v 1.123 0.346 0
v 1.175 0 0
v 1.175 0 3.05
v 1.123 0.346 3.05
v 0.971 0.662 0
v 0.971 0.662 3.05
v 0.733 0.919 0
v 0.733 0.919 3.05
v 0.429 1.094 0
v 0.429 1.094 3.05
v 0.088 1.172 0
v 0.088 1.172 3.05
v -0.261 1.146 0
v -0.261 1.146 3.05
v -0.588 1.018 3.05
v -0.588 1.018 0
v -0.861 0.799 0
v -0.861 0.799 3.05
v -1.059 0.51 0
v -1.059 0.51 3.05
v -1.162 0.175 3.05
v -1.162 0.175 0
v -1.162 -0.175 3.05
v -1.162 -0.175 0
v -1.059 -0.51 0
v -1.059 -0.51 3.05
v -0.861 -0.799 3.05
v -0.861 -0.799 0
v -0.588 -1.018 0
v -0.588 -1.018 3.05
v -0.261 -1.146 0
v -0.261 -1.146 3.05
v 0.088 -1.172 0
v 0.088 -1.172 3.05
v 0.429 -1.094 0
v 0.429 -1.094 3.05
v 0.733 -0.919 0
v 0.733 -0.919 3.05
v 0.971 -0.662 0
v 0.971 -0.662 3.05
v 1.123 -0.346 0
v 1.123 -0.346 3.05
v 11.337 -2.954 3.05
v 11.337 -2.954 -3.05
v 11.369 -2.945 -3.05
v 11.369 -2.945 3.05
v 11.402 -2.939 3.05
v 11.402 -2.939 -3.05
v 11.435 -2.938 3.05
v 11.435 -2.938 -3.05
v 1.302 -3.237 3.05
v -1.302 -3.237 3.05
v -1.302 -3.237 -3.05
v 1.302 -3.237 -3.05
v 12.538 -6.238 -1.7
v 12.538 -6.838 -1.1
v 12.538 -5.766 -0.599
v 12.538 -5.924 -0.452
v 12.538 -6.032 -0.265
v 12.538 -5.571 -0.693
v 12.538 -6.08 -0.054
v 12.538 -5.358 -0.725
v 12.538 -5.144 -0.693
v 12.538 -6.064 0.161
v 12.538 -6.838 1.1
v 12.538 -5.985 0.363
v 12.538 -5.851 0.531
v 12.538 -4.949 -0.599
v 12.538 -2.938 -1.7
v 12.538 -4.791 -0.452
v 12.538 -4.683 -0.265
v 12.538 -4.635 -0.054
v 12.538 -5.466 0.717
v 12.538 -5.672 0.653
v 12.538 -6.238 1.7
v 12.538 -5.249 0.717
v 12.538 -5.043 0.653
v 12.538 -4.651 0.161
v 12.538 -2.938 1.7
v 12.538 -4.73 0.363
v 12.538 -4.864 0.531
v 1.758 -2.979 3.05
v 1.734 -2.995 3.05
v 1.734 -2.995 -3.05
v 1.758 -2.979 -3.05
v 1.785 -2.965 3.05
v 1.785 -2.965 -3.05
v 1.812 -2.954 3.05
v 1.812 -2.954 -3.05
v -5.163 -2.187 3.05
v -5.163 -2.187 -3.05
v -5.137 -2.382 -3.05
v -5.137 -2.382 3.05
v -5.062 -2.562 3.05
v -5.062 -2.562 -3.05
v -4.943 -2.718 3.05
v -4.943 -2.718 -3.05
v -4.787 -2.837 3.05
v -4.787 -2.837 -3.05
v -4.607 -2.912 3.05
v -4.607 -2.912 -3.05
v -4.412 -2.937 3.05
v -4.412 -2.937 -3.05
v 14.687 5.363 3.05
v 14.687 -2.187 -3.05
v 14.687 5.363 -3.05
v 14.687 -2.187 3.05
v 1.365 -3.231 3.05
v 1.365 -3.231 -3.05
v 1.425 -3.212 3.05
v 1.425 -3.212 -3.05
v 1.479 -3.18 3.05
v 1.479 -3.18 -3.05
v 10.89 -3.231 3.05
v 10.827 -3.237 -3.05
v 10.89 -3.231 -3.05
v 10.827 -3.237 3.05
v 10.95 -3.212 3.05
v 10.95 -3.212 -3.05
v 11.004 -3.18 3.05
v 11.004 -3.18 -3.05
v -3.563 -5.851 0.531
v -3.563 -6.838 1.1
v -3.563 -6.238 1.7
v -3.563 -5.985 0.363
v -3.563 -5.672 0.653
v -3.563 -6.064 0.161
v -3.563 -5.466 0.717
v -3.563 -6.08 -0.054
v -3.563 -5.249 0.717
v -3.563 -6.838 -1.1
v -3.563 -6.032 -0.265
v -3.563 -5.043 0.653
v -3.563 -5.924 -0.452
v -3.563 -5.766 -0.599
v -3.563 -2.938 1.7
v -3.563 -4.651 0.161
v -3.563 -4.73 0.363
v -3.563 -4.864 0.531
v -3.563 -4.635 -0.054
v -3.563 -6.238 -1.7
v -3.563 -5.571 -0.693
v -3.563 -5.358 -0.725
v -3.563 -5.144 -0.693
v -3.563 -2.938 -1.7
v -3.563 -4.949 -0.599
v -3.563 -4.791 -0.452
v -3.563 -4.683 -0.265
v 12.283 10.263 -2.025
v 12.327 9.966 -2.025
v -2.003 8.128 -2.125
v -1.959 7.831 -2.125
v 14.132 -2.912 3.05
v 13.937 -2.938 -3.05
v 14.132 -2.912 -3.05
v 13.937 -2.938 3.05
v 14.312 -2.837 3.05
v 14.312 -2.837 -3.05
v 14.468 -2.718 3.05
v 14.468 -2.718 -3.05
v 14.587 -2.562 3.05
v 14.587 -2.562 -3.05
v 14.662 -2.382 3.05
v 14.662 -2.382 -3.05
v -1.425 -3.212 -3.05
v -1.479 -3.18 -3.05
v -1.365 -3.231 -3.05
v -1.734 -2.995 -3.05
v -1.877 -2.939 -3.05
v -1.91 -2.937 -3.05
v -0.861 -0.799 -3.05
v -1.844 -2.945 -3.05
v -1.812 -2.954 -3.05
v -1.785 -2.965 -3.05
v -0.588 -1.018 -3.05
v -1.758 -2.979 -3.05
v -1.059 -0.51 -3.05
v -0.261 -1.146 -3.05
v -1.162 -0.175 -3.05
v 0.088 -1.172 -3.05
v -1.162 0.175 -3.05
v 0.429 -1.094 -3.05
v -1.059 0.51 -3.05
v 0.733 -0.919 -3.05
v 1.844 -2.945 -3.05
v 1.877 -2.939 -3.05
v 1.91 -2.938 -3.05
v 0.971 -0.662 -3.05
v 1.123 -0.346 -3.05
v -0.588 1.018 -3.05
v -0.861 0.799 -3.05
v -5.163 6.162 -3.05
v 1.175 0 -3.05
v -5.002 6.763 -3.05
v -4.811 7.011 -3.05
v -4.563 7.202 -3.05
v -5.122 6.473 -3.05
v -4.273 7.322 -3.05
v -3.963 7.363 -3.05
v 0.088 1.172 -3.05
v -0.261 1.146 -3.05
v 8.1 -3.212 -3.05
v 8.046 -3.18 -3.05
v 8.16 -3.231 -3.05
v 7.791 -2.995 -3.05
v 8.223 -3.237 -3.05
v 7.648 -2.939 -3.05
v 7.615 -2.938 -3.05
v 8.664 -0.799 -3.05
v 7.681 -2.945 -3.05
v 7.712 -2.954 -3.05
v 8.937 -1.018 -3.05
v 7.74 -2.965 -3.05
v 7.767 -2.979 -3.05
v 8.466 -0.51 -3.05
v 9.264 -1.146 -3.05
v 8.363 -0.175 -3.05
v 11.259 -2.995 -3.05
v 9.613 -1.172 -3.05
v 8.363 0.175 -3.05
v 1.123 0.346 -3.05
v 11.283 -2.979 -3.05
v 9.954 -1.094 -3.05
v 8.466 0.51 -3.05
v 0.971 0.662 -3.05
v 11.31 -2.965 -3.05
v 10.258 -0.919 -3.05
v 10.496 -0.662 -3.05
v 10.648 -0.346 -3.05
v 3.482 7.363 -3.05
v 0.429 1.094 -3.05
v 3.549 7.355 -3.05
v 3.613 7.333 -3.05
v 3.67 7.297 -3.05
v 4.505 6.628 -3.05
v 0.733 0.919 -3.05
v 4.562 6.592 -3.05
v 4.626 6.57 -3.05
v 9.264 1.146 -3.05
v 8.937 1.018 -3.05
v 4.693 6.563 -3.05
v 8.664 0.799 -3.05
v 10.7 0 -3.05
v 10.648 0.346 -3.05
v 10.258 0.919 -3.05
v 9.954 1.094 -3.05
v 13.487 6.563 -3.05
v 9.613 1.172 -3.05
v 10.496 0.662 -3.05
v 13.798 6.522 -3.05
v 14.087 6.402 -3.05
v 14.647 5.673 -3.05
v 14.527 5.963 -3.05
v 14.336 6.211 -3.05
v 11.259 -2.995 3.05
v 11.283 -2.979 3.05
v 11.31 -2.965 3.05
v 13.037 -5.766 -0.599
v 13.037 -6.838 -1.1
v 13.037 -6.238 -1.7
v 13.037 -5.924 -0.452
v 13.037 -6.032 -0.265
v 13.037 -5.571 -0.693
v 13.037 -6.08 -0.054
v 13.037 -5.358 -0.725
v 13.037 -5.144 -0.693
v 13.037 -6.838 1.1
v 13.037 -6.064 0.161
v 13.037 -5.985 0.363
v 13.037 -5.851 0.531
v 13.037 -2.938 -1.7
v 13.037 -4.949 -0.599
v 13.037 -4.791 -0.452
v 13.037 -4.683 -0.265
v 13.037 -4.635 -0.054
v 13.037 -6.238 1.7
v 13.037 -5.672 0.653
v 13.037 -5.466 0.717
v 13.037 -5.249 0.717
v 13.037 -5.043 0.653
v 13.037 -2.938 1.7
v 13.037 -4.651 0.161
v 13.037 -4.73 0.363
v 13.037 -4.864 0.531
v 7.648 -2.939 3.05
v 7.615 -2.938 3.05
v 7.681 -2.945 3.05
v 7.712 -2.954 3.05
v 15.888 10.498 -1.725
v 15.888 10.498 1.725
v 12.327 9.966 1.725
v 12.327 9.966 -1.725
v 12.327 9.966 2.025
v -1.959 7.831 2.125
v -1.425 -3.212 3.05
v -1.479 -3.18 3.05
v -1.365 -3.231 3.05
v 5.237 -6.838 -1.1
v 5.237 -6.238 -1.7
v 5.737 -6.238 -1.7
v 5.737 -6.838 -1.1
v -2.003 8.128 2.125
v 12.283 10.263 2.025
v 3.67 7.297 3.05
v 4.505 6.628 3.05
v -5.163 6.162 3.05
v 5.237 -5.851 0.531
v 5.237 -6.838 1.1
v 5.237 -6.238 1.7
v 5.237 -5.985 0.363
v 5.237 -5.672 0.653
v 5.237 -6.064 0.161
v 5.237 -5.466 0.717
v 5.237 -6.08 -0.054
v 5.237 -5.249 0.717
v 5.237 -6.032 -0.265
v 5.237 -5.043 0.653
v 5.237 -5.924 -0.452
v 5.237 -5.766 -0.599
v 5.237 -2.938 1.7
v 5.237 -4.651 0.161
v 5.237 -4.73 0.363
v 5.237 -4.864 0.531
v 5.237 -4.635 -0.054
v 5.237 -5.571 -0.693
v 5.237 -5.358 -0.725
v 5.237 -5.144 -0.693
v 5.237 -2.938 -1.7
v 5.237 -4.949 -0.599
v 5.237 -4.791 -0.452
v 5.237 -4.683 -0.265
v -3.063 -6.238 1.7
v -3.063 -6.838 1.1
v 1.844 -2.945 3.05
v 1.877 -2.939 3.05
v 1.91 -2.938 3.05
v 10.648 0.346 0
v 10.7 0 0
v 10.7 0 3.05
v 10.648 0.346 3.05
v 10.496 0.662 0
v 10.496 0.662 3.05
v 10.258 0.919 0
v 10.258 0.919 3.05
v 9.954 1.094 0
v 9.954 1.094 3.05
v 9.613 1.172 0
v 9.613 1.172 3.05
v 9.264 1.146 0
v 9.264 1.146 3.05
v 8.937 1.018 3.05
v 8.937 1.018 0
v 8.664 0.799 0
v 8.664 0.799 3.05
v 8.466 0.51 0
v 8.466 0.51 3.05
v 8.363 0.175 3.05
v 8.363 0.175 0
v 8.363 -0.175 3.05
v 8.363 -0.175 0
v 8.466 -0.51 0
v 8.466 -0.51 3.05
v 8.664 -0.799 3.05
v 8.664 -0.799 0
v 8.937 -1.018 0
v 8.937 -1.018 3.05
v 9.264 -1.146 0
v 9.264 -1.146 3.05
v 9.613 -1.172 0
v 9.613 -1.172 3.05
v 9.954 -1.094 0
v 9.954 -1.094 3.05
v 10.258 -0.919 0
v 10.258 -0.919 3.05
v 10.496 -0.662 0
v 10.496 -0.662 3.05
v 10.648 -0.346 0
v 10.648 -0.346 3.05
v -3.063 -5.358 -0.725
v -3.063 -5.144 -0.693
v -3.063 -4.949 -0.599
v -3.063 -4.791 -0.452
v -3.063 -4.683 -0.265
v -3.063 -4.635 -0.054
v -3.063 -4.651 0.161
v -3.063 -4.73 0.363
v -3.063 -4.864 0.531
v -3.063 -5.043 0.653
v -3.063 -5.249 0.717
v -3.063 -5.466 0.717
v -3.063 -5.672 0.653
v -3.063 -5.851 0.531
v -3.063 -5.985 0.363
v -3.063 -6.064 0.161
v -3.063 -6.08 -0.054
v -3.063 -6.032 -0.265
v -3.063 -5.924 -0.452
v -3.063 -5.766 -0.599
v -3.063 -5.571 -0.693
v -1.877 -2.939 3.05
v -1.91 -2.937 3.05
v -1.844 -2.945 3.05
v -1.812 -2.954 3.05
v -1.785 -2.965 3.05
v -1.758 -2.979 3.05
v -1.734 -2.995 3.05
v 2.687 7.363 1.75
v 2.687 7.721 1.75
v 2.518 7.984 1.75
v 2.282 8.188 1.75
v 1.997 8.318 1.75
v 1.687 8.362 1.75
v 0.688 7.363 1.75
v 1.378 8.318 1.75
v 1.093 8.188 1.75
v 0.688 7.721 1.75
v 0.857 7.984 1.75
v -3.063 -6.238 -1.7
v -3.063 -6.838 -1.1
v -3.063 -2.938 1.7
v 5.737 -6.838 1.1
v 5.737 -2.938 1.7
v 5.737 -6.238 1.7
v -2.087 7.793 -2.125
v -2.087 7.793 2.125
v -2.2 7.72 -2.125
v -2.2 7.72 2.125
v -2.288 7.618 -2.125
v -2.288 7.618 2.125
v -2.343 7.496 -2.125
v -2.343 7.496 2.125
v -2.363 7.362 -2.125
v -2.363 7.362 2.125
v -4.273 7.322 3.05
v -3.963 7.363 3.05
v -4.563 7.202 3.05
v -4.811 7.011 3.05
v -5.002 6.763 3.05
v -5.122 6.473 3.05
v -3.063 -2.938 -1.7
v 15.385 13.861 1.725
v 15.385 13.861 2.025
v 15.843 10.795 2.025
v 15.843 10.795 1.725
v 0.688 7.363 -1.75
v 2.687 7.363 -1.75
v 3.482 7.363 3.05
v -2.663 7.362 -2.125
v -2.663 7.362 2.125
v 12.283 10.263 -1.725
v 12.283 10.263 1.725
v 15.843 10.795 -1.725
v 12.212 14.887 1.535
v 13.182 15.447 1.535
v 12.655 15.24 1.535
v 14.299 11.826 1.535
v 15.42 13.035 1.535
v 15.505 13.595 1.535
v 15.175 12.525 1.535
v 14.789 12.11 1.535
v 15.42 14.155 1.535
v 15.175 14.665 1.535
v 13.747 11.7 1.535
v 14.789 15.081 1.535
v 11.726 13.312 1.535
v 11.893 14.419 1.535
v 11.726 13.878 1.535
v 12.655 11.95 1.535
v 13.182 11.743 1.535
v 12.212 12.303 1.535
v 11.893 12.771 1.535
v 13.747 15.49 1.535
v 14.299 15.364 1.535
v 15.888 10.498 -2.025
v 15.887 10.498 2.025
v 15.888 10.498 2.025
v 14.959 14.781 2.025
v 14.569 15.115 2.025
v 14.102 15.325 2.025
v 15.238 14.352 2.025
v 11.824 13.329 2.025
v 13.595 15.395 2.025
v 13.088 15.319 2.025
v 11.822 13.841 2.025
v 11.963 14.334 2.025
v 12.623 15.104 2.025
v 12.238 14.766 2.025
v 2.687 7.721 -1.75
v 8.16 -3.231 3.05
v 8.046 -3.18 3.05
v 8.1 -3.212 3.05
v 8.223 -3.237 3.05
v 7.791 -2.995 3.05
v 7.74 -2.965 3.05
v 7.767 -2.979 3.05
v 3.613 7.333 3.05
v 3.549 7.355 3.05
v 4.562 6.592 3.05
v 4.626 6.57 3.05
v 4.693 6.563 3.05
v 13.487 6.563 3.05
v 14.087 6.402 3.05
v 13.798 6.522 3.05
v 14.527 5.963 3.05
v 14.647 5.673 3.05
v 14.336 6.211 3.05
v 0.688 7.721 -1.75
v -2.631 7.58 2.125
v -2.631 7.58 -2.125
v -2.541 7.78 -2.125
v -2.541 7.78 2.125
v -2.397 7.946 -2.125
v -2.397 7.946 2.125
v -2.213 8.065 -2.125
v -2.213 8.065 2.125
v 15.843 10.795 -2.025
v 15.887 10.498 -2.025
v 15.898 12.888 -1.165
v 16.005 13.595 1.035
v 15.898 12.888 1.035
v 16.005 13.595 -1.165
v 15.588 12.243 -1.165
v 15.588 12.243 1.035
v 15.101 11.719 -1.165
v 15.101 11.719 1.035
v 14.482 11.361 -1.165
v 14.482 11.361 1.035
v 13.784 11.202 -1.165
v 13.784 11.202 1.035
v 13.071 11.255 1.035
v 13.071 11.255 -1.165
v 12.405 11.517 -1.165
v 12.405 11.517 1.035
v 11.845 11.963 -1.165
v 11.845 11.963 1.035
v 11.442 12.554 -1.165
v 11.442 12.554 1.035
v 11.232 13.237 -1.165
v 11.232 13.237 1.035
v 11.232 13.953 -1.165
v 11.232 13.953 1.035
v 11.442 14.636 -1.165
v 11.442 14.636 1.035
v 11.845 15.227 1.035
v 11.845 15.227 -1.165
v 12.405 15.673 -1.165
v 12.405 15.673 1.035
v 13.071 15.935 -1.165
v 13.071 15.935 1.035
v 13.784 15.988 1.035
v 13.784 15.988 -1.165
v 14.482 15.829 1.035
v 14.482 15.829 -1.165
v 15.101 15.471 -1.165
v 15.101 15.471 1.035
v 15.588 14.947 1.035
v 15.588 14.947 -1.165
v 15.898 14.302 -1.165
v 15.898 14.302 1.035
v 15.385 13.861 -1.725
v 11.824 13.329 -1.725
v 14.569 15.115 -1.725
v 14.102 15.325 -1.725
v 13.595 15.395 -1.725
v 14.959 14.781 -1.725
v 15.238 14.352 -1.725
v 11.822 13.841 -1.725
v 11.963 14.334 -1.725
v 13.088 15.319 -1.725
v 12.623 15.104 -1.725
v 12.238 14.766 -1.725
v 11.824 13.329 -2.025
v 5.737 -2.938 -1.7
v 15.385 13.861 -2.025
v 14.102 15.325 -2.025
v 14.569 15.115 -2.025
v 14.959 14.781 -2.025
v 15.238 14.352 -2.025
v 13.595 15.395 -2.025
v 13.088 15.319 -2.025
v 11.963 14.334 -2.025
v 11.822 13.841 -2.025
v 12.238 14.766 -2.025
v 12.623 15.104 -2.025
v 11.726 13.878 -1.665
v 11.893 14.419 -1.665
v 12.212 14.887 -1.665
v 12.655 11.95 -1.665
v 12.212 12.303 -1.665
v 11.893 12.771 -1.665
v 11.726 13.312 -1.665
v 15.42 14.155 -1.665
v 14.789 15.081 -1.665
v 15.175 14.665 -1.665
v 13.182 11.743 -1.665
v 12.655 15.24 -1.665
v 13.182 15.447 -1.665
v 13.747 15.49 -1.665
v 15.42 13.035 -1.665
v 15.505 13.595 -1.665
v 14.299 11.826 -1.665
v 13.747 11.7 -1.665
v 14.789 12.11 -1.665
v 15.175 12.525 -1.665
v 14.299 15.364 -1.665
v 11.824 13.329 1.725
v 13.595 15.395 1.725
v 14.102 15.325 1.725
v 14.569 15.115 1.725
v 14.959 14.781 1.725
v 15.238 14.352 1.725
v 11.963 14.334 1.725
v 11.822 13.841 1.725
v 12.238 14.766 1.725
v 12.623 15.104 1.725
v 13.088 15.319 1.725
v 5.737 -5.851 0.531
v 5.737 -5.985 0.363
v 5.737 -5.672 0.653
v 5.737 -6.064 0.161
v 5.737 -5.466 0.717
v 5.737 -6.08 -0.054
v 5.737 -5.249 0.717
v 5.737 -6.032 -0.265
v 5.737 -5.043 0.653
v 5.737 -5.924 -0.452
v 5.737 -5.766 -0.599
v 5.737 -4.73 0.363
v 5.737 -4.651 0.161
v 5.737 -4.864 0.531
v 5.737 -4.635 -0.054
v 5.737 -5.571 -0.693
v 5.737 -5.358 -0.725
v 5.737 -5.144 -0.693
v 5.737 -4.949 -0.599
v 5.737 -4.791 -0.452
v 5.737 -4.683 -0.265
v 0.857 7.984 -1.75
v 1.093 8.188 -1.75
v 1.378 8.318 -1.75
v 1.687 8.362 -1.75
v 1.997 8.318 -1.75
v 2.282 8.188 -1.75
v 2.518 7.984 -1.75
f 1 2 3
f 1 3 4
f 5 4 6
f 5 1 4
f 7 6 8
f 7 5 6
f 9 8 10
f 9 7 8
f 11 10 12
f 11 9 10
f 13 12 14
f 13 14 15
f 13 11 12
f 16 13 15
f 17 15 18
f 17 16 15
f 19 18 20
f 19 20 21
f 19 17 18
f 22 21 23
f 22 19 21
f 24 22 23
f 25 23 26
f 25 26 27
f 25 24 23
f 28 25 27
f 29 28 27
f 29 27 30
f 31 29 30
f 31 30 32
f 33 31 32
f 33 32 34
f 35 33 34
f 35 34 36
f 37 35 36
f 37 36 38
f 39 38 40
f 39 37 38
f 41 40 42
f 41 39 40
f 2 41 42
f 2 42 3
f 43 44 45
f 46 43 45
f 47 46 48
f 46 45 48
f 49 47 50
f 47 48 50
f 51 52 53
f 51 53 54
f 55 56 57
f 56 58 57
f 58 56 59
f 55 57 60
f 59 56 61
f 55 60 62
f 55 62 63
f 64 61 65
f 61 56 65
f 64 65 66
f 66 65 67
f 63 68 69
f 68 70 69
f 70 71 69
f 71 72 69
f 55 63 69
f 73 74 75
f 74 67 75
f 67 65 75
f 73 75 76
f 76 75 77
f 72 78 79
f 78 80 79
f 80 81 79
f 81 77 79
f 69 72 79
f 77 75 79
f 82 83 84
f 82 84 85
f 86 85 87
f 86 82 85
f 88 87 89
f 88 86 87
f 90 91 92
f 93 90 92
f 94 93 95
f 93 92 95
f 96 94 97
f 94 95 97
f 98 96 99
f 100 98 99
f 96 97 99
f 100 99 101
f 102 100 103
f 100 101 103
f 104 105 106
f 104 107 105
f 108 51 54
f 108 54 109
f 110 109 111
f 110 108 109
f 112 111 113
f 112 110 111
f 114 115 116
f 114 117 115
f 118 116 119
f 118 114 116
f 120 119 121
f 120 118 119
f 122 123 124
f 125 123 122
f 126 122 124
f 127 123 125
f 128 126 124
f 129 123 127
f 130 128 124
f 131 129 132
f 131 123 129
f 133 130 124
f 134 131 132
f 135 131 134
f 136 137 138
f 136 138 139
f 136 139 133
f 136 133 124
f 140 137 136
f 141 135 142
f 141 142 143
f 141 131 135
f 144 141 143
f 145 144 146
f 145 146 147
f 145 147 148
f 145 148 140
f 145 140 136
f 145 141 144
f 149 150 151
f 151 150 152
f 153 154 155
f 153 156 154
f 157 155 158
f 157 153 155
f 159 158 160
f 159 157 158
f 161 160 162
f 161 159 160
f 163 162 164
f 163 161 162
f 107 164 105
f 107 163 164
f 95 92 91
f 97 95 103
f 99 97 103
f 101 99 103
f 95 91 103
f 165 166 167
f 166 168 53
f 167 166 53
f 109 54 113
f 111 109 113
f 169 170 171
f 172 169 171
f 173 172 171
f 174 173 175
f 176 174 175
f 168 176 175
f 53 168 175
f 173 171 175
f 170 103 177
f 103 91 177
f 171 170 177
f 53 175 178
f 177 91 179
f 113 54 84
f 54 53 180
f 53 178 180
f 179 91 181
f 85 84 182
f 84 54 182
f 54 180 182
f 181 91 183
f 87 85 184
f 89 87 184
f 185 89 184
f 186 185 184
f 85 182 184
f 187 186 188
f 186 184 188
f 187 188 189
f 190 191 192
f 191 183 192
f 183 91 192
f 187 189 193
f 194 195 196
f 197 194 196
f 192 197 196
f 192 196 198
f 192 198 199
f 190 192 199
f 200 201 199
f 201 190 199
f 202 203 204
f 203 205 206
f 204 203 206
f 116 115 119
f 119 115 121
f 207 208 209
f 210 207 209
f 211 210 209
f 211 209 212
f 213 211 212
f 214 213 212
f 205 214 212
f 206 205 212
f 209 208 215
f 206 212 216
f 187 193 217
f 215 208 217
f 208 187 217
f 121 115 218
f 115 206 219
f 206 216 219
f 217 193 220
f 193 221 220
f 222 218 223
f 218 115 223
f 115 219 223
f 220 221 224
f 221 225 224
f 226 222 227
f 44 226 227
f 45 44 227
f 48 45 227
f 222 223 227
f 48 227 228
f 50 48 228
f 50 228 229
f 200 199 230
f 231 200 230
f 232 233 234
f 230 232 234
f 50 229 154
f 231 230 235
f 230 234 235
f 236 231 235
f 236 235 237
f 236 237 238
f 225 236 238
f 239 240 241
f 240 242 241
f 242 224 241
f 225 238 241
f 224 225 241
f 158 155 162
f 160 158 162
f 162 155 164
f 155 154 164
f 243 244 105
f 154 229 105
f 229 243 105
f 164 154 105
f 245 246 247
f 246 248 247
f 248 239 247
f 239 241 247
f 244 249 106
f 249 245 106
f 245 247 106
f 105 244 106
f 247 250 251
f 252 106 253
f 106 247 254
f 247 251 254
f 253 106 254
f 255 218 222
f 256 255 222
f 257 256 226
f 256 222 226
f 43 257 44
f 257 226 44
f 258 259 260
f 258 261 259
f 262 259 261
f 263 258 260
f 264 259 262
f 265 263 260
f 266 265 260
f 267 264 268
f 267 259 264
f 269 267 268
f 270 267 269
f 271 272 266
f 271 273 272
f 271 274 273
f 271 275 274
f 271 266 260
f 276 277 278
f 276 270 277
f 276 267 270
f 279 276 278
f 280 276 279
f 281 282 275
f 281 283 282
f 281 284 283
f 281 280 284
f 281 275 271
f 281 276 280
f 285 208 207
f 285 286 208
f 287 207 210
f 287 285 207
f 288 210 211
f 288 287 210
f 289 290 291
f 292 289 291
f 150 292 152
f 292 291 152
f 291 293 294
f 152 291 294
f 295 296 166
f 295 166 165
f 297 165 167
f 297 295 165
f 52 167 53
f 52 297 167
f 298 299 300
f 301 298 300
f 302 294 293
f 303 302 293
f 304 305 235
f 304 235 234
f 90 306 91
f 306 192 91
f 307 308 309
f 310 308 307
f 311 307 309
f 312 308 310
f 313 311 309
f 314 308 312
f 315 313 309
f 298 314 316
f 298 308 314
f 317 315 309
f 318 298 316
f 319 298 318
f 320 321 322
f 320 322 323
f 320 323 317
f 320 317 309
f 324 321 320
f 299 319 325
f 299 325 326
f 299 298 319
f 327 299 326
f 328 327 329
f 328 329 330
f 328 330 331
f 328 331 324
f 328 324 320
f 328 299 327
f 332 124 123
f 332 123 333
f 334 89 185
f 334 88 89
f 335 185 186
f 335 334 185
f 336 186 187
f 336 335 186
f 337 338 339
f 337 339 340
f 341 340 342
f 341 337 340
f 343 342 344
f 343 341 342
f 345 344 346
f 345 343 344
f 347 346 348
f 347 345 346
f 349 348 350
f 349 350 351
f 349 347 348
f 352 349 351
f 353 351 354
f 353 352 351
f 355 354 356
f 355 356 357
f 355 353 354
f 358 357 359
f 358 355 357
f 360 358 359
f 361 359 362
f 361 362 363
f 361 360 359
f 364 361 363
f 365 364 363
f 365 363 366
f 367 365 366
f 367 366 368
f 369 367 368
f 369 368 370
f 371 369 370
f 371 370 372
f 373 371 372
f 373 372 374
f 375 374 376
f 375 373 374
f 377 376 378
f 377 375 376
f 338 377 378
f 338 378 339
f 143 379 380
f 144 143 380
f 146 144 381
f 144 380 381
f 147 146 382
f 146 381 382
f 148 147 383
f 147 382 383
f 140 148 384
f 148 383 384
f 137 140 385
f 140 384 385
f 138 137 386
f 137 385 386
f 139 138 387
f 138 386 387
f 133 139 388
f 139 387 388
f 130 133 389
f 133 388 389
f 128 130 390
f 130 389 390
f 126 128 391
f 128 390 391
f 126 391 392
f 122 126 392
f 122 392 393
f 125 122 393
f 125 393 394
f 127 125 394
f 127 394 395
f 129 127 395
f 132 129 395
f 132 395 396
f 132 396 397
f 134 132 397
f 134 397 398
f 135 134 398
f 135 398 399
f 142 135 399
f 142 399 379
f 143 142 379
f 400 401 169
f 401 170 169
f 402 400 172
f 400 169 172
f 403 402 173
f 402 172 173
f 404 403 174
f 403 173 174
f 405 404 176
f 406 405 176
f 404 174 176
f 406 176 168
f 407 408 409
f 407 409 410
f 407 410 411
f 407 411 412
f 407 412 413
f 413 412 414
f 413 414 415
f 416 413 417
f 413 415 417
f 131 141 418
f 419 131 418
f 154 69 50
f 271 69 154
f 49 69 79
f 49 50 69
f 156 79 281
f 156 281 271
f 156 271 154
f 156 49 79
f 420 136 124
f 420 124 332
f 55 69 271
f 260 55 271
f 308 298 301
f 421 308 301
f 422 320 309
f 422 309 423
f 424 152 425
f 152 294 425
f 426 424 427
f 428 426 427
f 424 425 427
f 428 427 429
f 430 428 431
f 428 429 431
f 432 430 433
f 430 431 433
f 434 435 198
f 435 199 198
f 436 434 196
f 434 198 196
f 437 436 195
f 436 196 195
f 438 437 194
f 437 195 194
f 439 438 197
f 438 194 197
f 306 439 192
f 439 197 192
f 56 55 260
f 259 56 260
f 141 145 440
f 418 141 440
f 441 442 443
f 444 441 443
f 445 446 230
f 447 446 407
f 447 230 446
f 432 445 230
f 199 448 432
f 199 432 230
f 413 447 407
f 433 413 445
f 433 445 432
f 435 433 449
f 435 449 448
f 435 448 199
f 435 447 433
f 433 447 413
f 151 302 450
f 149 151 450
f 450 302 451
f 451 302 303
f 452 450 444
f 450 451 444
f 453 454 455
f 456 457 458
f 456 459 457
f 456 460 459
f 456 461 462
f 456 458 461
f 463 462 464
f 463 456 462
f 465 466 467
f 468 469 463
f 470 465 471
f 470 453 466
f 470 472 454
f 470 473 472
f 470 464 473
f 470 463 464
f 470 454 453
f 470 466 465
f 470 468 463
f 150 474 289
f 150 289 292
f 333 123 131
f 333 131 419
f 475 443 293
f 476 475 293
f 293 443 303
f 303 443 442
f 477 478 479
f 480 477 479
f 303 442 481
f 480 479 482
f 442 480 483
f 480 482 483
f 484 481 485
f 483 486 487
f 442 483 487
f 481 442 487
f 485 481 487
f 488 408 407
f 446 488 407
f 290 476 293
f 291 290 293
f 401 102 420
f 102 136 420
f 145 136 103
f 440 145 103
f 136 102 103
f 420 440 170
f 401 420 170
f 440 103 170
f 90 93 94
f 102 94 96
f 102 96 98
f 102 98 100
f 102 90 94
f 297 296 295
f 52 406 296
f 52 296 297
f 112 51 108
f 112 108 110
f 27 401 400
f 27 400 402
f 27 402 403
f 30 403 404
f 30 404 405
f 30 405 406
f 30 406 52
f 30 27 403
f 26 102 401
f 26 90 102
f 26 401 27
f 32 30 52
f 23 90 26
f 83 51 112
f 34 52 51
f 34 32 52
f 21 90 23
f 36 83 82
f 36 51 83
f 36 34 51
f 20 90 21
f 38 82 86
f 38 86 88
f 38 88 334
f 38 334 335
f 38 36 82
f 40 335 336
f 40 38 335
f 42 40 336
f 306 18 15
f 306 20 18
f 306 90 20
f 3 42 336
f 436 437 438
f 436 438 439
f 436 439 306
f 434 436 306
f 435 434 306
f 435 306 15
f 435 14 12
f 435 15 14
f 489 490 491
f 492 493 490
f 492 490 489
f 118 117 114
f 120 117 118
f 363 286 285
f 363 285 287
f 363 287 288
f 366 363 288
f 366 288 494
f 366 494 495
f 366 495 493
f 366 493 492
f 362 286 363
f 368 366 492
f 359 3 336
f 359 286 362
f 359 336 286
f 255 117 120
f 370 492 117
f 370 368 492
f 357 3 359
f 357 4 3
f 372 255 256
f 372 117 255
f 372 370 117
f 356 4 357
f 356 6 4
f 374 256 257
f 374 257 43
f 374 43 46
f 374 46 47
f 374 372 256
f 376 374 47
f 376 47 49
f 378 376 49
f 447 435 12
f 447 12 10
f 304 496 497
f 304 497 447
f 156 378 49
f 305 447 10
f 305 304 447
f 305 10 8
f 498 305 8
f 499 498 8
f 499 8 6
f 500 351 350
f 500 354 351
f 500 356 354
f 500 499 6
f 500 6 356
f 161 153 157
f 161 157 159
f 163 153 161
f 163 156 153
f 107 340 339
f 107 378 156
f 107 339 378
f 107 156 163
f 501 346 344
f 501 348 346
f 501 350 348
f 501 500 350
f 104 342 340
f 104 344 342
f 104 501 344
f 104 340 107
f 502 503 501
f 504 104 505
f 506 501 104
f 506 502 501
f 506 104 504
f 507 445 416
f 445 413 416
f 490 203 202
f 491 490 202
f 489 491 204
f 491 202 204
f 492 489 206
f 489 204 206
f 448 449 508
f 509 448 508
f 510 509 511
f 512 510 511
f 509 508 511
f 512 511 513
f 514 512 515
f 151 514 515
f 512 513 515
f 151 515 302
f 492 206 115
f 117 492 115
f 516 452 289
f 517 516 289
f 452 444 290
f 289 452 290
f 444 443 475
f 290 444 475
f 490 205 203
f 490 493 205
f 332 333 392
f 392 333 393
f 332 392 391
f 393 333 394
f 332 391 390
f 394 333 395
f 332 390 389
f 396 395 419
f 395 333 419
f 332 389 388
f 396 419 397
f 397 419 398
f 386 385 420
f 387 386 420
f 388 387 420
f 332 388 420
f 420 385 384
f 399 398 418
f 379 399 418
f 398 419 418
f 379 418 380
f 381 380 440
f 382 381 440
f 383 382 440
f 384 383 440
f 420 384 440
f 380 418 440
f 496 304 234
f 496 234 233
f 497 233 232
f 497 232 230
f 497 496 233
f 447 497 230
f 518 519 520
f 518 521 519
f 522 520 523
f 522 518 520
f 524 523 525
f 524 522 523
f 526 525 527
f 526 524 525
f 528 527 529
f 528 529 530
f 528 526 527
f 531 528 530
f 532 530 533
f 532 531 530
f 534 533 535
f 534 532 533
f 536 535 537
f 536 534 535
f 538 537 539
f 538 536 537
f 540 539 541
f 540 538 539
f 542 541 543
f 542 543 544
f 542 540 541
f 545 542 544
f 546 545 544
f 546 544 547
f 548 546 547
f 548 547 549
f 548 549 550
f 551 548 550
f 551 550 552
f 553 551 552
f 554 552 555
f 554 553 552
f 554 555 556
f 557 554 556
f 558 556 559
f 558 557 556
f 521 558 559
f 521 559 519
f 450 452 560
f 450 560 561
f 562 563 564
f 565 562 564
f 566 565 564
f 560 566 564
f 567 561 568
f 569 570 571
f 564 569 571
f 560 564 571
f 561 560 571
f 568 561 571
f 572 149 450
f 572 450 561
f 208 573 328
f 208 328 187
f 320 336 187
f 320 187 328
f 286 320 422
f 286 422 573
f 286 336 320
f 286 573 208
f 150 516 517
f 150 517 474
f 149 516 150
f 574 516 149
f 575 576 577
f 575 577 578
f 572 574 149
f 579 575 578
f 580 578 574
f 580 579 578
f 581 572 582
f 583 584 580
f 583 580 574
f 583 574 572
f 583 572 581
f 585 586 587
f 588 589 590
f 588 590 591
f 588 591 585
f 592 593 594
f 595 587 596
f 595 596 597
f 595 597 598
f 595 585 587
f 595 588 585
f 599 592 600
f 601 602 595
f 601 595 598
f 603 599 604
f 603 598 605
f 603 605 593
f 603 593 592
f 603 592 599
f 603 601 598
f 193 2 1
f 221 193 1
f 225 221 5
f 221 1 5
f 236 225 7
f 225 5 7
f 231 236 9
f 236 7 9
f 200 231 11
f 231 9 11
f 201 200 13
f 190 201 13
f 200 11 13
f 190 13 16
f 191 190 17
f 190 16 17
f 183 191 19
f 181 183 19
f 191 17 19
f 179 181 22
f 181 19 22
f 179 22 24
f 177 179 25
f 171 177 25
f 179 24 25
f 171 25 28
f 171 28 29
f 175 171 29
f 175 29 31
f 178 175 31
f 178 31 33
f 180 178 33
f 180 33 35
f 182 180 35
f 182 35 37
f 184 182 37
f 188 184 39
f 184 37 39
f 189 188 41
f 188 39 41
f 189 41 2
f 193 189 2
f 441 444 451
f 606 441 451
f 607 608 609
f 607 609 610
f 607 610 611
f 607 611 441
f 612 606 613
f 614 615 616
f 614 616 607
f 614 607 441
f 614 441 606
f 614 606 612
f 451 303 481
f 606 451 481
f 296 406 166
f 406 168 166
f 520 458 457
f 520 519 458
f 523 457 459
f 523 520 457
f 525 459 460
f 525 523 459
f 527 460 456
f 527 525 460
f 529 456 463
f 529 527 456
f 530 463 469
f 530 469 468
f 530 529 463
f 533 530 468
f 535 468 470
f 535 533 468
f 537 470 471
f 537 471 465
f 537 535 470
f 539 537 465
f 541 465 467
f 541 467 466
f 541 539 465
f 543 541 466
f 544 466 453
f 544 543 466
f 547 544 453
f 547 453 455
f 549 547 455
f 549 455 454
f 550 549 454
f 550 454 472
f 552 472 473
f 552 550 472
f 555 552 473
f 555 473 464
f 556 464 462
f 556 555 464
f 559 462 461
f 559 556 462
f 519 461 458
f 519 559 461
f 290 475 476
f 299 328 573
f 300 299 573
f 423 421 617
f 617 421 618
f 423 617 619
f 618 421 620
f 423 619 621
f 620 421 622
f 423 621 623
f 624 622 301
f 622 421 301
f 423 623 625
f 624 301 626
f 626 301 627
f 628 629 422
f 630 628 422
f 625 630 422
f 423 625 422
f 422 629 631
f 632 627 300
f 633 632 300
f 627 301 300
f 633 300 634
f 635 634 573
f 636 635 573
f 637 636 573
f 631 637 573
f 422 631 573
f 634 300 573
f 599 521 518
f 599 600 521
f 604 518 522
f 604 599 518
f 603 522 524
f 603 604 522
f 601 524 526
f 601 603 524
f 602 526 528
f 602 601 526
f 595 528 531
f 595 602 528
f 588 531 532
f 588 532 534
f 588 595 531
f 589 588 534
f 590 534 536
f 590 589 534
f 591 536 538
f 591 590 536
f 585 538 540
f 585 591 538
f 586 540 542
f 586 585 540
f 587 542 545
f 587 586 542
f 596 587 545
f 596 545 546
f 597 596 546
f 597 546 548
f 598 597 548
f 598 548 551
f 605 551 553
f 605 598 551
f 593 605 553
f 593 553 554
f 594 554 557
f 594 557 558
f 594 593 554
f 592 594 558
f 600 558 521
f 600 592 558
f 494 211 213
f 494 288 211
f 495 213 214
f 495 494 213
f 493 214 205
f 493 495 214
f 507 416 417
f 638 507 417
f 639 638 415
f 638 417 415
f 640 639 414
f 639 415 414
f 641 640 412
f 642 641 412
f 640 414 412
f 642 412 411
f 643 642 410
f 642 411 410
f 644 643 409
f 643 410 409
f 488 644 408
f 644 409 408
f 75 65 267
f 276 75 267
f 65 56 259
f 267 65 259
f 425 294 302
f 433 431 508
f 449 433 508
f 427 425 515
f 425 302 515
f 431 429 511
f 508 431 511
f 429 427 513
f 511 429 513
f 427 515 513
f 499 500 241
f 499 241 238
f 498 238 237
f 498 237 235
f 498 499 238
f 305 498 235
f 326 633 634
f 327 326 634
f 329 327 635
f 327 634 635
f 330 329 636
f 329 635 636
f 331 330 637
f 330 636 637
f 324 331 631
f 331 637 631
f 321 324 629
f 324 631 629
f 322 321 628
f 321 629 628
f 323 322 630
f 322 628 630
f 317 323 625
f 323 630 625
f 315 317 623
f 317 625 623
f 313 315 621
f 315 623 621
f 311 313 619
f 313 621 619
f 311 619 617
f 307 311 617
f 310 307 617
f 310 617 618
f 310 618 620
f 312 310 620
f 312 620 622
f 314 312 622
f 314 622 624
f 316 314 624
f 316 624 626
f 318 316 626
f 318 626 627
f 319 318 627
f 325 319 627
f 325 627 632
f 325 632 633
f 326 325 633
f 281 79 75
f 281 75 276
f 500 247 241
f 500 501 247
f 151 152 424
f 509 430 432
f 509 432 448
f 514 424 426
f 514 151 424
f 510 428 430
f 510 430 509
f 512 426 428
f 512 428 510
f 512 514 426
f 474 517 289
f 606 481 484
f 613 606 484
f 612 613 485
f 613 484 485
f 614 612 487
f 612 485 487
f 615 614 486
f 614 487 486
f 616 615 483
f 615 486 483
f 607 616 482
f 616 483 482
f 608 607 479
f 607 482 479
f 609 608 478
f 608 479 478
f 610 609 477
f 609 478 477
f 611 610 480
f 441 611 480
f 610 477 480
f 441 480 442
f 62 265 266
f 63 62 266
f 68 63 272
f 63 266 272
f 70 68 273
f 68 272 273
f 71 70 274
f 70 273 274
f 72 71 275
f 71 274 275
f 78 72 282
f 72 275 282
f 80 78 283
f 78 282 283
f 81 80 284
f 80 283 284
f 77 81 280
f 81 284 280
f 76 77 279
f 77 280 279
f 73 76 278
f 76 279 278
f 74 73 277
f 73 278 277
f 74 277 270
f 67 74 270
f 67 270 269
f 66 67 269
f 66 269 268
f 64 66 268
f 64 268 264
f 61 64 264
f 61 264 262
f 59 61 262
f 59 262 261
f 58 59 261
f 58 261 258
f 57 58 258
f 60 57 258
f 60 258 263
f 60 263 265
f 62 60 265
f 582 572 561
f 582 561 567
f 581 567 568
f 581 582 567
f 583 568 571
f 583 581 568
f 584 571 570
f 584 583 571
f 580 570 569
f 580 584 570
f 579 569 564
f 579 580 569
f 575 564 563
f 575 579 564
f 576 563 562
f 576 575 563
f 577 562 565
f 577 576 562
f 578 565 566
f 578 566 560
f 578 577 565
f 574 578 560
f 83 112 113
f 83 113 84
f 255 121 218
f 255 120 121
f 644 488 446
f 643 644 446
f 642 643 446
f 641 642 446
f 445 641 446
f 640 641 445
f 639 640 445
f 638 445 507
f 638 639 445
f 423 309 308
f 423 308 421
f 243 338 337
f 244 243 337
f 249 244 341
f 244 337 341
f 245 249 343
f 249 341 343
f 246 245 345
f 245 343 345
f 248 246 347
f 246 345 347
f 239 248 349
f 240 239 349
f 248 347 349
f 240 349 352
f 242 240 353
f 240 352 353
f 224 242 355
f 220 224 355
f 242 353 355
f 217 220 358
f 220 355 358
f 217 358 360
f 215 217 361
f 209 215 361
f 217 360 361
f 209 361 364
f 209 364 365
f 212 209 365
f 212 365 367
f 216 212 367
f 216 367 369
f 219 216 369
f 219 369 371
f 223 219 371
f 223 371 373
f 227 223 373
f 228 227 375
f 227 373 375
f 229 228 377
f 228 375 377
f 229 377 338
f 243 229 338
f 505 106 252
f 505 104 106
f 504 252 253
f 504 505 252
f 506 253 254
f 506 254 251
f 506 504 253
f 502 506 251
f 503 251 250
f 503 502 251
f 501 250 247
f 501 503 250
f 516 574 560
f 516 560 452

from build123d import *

# Parameters (mm, degrees)
SKETCH_2_R          = 1.175
EXTRUDE_1_DEPTH     = 3.05
SKETCH_3_W          = 0.500000082
SKETCH_3_H          = 3.90000036
SKETCH_3_W_2        = 0.500000024
SKETCH_3_W_3        = 0.499999151
EXTRUDE_2_DEPTH     = 1.7
CHAMFER_1_SIZE      = 0.6
SKETCH_4_R          = 0.725
CUT_EXTRUDE_1_DEPTH = 20.868288851
EXTRUDE_3_DEPTH     = 2.125
CUT_EXTRUDE_START   = -0.3
CUT_EXTRUDE_2_DEPTH = 0.3
EXTRUDE_4_DEPTH     = 0.3
EXTRUDE_5_DEPTH     = 1.75


with BuildPart() as part:
    # 草图2 → 凸台-拉伸1 (new, symmetric)
    with BuildSketch(Plane.XY):
        with BuildLine():
            Line((13.487499724, 6.562500338), (4.69273426, 6.562500338))
            ThreePointArc((4.69273426, 6.562500338), (4.593432177, 6.579411842), (4.505325746, 6.628239695))
            Line((4.505325746, 6.628239695), (3.669674138, 7.296760981))
            ThreePointArc((3.669674138, 7.296760981), (3.581567707, 7.345588834), (3.482265624, 7.362500338))
            Line((3.482265624, 7.362500338), (-3.962500435, 7.362500338))
            ThreePointArc((-3.962500435, 7.362500338), (-4.811028502, 7.011028231), (-5.162500208, 6.162499997))
            Line((-5.162500208, 6.162499997), (-5.162500208, -2.187499788))
            ThreePointArc((-5.162500208, -2.187499788), (-4.942830121, -2.717830133), (-4.412499671, -2.937499962))
            Line((-4.412499671, -2.937499962), (-1.910055005, -2.937499962))
            ThreePointArc((-1.910055005, -2.937499962), (-1.860600884, -2.941604254), (-1.812499919, -2.953804763))
            ThreePointArc((-1.812499919, -2.953804763), (-1.771521076, -2.971401684), (-1.73360371, -2.994879131))
            Line((-1.73360371, -2.994879131), (-1.47889644, -3.180120782))
            ThreePointArc((-1.47889644, -3.180120782), (-1.395218116, -3.222794781), (-1.302444791, -3.237499962))
            Line((-1.302444791, -3.237499962), (1.302444797, -3.237499962))
            ThreePointArc((1.302444797, -3.237499962), (1.395218044, -3.222794752), (1.478896294, -3.180120768))
            Line((1.478896294, -3.180120768), (1.733603576, -2.994879137))
            ThreePointArc((1.733603576, -2.994879137), (1.771521006, -2.971401677), (1.812499919, -2.953804763))
            ThreePointArc((1.812499919, -2.953804763), (1.860600869, -2.9416043), (1.910054967, -2.937500048))
            Line((1.910054967, -2.937500048), (7.61494474, -2.937500048))
            ThreePointArc((7.61494474, -2.937500048), (7.664398838, -2.941604317), (7.712499786, -2.953804797))
            ThreePointArc((7.712499786, -2.953804797), (7.753478741, -2.97140175), (7.791396204, -2.994879262))
            Line((7.791396204, -2.994879262), (8.046103615, -3.180120719))
            ThreePointArc((8.046103615, -3.180120719), (8.129781833, -3.222794684), (8.222555042, -3.237499892))
            Line((8.222555042, -3.237499892), (10.827444745, -3.237499892))
            ThreePointArc((10.827444745, -3.237499892), (10.920217939, -3.22279471), (11.003896153, -3.18012078))
            Line((11.003896153, -3.18012078), (11.25860355, -2.994879149))
            ThreePointArc((11.25860355, -2.994879149), (11.296520992, -2.971401705), (11.337499914, -2.953804809))
            ThreePointArc((11.337499914, -2.953804809), (11.385600857, -2.94160437), (11.435054945, -2.937500139))
            Line((11.435054945, -2.937500139), (13.93749961, -2.937500139))
            ThreePointArc((13.93749961, -2.937500139), (14.467829886, -2.717830091), (14.687499579, -2.187499669))
            Line((14.687499579, -2.187499669), (14.687499973, 5.362500307))
            ThreePointArc((14.687499973, 5.362500307), (14.336028024, 6.211028543), (13.487499724, 6.562500338))
        make_face()
        Circle(SKETCH_2_R, mode=Mode.SUBTRACT)
        with Locations((9.524999919, 0)):
            Circle(SKETCH_2_R, mode=Mode.SUBTRACT)
    extrude(amount=EXTRUDE_1_DEPTH, both=True)

    # 草图3 → 凸台-拉伸2 (add, symmetric)
    with BuildSketch(Plane.XY):
        with Locations((-3.312500165, -4.887500279)):
            Rectangle(SKETCH_3_W, SKETCH_3_H)
        with Locations((5.487499933, -4.887500279)):
            Rectangle(SKETCH_3_W_2, SKETCH_3_H)
        with Locations((12.787499959, -4.887500279)):
            Rectangle(SKETCH_3_W_3, SKETCH_3_H)
    extrude(amount=EXTRUDE_2_DEPTH, both=True)

    # 倒角1
    chamfer_1_edges = [part.edges().sort_by_distance(p)[0] for p in [
        (5.487499933, -6.837500459, -1.7),
        (5.487499933, -6.837500459, 1.7),
        (12.787499959, -6.837500459, -1.7),
        (12.787499959, -6.837500459, 1.7),
        (-3.312500165, -6.837500459, -1.7),
        (-3.312500165, -6.837500459, 1.7),
    ]]
    chamfer(chamfer_1_edges, length=CHAMFER_1_SIZE)

    # 草图4 → 切除-拉伸1 (cut, through all)
    with BuildSketch(Plane(origin=(13.037499535, 0, 0), x_dir=(0, 0, -1), z_dir=(1, 0, 0))):
        with Locations((0, -5.357500459)):
            Circle(SKETCH_4_R)
    extrude(amount=-CUT_EXTRUDE_1_DEPTH, mode=Mode.SUBTRACT)

    # 草图5 → 凸台-拉伸3 (add, symmetric)
    with BuildSketch(Plane.XY):
        with BuildLine():
            Line((-2.00288027, 8.128026474), (15.843157285, 10.795134123))
            Line((15.843157285, 10.795134123), (15.887499977, 10.498430316))
            Line((15.887499977, 10.498430316), (-1.958537352, 7.83132183))
            ThreePointArc((-1.958537352, 7.83132183), (-2.247579011, 7.671926839), (-2.36250018, 7.3625))
            Line((-2.36250018, 7.3625), (-2.662500081, 7.3625))
            ThreePointArc((-2.662500081, 7.3625), (-2.474848467, 7.867754658), (-2.00288027, 8.128026474))
        make_face()
    extrude(amount=EXTRUDE_3_DEPTH, both=True)

    # 草图6 → 切除-拉伸2 (cut)
    with BuildSketch(Plane(origin=(-1.231960405, 8.243241197, 0), x_dir=(0.9890158676886913, 0.14780938217848383, 0), z_dir=(-0.1478093821784838, 0.9890158676886912, 0)).offset(CUT_EXTRUDE_START)):
        Polygon((17.264756054, 2.025), (13.664756054, 2.025), (-0.779481797, 2.125), (17.264756054, 2.125), align=None)
        Polygon((13.664756054, -2.025), (17.264756054, -2.025), (17.264756054, -2.125), (-0.779481797, -2.125), align=None)
    extrude(amount=CUT_EXTRUDE_2_DEPTH, mode=Mode.SUBTRACT)

    # 草图7 → 凸台-拉伸4 (add)
    with BuildSketch(Plane.XY.offset(2.025)):
        with BuildLine():
            Line((15.384947921, 13.861083805), (15.887500281, 10.498429449))
            Line((15.887500281, 10.498429449), (12.327042625, 9.966315937))
            Line((12.327042625, 9.966315937), (11.824490813, 13.328969925))
            ThreePointArc((11.824490813, 13.328969925), (13.338662427, 15.375255419), (15.384947921, 13.861083805))
        make_face()
    extrude_4 = extrude(amount=-EXTRUDE_4_DEPTH)

    # 镜向2: 凸台-拉伸4 across plane
    add(extrude_4.mirror(Plane.XY))

    # 草图9 → 凸台-拉伸5 (add, symmetric)
    with BuildSketch(Plane.XY):
        with BuildLine():
            Line((2.687499919, 7.720757525), (2.687499919, 7.362500054))
            Line((2.687499919, 7.362500054), (0.687500025, 7.362500099))
            Line((0.687500025, 7.362500099), (0.687500025, 7.720757542))
            ThreePointArc((0.687500025, 7.720757542), (1.687499978, 8.362499924), (2.687499919, 7.720757525))
        make_face()
    extrude(amount=EXTRUDE_5_DEPTH, both=True)


with BuildPart() as body_2:
    # 草图8 → 旋转1 (revolve)
    with BuildSketch(Plane(origin=(-1.69016956, 11.309190857, 0), x_dir=(0.9890158676886913, 0.14780938217848383, 0), z_dir=(-0.1478093821784838, 0.9890158676886912, 0)), mode=Mode.PRIVATE) as revolve_1_sk:
        Polygon((15.464755851, 1.665), (15.464755851, -1.535), (13.564755851, -1.535), (13.064755851, -1.035), (13.064755851, 1.165), (13.564755851, 1.665), align=None)
    revolve(revolve_1_sk.sketch.rotate(Axis((13.604719367, 13.595026865, -1.725), (0, 0, -1)), 188.499998323), axis=Axis((13.604719367, 13.595026865, -1.725), (0, 0, -1)))


solid = Compound([part.part, body_2.part])
